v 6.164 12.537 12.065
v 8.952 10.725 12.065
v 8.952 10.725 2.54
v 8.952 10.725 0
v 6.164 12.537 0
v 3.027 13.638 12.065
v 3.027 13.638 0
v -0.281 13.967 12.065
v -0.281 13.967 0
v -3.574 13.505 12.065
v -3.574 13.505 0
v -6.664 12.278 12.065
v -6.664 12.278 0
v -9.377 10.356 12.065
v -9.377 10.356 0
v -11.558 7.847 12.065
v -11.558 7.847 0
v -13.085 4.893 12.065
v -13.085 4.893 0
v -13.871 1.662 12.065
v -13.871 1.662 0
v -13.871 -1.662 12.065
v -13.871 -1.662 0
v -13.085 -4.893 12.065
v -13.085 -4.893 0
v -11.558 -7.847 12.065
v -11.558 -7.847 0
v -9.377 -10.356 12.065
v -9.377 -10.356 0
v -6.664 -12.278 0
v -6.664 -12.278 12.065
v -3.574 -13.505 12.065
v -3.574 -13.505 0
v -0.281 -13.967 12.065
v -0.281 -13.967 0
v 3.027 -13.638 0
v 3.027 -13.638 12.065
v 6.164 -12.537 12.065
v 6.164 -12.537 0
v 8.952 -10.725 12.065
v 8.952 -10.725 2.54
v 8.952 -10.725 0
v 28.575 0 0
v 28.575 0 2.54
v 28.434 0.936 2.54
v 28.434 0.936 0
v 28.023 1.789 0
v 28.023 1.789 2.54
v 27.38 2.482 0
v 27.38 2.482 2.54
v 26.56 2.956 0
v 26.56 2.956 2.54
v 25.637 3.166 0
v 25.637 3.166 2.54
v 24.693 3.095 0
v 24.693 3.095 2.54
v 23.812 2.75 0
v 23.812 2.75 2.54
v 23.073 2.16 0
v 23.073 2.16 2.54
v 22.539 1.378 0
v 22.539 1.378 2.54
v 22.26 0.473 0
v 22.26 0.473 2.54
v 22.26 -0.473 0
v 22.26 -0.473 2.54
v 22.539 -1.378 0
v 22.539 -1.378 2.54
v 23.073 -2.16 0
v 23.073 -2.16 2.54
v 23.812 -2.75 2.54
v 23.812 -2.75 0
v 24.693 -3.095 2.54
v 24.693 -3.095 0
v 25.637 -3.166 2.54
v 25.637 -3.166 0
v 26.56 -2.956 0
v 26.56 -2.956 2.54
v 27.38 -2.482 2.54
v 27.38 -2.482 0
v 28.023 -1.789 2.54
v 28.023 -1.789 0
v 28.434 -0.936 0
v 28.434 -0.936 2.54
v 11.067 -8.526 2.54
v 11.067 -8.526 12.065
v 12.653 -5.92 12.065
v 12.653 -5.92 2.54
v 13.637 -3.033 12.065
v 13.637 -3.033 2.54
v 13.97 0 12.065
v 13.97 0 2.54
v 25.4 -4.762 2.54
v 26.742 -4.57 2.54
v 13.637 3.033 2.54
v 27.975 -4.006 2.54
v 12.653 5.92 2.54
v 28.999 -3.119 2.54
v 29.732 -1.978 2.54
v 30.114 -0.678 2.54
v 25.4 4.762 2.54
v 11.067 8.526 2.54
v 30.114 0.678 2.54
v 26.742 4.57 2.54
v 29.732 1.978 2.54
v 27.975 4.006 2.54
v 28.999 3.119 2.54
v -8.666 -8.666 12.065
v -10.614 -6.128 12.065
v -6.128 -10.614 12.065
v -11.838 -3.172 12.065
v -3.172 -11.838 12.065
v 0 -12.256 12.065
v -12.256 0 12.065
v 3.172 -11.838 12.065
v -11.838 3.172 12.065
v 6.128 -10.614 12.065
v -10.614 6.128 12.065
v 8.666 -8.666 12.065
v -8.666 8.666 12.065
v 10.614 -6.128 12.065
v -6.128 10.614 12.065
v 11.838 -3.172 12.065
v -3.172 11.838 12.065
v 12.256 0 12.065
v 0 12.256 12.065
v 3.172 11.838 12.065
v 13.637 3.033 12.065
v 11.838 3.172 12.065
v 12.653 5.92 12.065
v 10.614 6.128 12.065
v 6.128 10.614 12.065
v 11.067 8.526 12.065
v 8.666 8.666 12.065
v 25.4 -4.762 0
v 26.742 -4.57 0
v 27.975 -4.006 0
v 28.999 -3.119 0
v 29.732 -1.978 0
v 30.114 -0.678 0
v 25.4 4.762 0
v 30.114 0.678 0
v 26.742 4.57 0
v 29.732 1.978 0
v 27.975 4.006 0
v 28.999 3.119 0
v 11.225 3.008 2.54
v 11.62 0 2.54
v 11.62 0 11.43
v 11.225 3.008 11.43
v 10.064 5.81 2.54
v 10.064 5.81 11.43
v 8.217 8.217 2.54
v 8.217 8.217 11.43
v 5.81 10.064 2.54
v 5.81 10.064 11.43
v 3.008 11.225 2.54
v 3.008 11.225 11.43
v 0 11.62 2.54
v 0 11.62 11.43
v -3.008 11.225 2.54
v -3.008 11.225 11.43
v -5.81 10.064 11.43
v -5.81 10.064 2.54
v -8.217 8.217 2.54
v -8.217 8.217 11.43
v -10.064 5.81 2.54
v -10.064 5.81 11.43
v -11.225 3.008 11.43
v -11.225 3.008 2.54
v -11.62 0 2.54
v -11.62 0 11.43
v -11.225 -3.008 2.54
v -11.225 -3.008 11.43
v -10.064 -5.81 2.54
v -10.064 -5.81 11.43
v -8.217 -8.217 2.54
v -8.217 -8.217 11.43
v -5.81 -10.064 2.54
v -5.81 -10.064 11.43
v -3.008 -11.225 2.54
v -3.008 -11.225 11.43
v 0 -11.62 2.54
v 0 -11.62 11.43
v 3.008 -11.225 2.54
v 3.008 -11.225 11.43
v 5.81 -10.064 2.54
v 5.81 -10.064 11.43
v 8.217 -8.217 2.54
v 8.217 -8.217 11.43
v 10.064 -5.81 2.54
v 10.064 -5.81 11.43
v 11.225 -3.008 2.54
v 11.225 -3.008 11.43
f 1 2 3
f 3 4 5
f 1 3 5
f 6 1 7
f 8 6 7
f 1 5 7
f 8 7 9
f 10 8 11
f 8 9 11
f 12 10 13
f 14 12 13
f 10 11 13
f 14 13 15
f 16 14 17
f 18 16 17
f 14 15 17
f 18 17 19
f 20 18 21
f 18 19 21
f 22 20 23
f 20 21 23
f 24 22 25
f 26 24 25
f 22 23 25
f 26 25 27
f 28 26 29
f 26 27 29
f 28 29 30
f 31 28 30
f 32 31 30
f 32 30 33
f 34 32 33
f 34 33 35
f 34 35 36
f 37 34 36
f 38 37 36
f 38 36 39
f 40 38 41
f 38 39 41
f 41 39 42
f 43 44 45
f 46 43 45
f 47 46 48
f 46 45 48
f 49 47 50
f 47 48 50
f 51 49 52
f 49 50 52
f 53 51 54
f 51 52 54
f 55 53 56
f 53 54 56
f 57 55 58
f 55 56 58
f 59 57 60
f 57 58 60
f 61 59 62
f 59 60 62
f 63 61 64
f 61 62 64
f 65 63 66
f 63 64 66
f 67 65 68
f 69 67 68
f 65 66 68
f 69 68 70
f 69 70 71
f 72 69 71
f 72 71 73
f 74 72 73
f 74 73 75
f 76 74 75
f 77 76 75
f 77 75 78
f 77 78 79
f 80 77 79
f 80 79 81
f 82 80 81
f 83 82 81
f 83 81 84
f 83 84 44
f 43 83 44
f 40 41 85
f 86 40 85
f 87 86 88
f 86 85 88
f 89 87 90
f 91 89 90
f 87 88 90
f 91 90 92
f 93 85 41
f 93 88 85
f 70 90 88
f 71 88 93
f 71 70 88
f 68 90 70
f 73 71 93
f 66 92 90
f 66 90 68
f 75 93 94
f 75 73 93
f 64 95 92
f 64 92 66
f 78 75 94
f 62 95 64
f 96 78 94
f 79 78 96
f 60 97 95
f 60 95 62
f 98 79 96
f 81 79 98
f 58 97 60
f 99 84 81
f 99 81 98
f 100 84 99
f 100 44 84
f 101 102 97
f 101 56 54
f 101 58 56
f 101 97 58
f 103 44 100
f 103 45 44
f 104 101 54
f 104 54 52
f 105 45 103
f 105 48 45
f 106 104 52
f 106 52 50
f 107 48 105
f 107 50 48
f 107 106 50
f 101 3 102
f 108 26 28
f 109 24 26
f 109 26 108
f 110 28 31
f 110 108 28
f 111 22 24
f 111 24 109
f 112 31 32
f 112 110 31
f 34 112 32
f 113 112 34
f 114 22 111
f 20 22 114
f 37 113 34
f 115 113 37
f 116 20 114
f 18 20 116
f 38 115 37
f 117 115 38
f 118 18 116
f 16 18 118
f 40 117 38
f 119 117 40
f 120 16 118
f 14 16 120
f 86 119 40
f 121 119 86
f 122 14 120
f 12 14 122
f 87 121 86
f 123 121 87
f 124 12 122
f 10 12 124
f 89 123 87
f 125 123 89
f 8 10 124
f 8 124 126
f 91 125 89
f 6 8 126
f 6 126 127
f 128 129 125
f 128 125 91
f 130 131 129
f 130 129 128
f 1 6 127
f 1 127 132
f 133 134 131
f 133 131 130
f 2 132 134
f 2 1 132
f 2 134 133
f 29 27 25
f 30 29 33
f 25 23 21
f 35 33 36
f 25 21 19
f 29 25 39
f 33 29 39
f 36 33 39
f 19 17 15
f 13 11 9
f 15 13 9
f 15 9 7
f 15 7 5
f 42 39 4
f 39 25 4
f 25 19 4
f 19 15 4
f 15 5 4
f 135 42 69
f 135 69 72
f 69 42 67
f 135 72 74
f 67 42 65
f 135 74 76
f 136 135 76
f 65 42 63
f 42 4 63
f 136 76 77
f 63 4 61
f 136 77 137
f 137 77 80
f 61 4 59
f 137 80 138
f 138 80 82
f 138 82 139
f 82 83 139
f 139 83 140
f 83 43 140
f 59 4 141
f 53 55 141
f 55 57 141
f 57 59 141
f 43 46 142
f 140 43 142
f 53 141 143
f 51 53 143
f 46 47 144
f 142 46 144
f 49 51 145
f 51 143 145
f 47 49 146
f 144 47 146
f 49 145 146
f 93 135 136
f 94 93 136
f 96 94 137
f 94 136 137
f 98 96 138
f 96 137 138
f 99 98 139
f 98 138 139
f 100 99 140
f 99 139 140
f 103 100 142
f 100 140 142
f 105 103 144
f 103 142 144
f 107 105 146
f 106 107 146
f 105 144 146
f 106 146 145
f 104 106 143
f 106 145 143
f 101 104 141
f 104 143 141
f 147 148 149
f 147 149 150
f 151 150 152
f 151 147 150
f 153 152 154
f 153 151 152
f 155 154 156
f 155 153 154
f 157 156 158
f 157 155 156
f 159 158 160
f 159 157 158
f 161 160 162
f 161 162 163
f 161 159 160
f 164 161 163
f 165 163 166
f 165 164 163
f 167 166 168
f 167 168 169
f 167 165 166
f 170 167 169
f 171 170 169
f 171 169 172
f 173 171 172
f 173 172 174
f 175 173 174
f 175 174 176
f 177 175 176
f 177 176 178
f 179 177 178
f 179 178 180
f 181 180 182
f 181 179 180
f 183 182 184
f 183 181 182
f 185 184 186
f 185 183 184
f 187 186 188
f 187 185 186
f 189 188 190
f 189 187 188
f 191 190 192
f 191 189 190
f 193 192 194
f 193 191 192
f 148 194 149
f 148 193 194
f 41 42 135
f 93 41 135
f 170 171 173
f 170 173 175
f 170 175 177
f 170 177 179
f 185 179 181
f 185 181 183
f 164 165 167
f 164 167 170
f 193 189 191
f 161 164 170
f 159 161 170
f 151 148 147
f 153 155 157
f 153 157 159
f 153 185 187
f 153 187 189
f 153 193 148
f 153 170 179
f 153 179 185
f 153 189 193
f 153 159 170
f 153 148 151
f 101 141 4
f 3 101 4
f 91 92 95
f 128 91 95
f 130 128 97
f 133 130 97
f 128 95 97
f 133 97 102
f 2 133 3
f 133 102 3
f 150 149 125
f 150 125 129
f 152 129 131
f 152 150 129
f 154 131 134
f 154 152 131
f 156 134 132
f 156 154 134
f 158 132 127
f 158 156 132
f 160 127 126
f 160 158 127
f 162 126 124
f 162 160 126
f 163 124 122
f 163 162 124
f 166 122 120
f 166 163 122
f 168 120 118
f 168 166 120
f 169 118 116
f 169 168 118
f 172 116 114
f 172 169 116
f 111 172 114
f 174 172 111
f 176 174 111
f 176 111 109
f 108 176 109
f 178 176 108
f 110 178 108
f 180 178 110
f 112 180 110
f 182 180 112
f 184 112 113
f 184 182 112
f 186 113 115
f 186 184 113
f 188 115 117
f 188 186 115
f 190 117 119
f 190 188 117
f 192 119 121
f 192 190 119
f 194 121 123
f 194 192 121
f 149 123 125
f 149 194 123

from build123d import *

# Parameters (mm, degrees)
F1_DEPTH = 2.54
F2_R     = 11.6205
F3_DEPTH = 9.525
F4_SIZE  = 0.635
F5_R     = 3.175
F6_DEPTH = 2.541


with BuildPart() as f1:
    # F0 (on Top) → F1 (new body)
    with BuildSketch(Plane.XY):
        with BuildLine():
            Line((25.4, 4.7625), (8.951913, 10.724932))
            ThreePointArc((8.951913, 10.724932), (-13.97, 0), (8.951913, -10.724932))
            Line((8.951913, -10.724932), (25.4, -4.7625))
            ThreePointArc((25.4, -4.7625), (30.1625, 0), (25.4, 4.7625))
        make_face()
    extrude(amount=F1_DEPTH)

    # F2 (on face) → F3 (join)
    with BuildSketch(Plane.XY.offset(2.54)):
        with BuildLine():
            ThreePointArc((8.951913, -10.724932), (12.653441, -5.920417), (13.97, 0))
            ThreePointArc((13.97, 0), (12.653441, 5.920417), (8.951913, 10.724932))
            ThreePointArc((8.951913, 10.724932), (-13.97, 0), (8.951913, -10.724932))
        make_face()
        Circle(F2_R, mode=Mode.SUBTRACT)
    extrude(amount=F3_DEPTH)

    # F4
    f4_edges = [f1.edges().sort_by_distance(p)[0] for p in [
        (-11.6205, 0, 12.065),
    ]]
    chamfer(f4_edges, length=F4_SIZE)

    # F5 (on face) → F6 (cut, through all)
    with BuildSketch(Plane.XY.offset(2.54)):
        with Locations((25.4, 0)):
            Circle(F5_R)
    extrude(amount=-F6_DEPTH, mode=Mode.SUBTRACT)


solid = f1.part
